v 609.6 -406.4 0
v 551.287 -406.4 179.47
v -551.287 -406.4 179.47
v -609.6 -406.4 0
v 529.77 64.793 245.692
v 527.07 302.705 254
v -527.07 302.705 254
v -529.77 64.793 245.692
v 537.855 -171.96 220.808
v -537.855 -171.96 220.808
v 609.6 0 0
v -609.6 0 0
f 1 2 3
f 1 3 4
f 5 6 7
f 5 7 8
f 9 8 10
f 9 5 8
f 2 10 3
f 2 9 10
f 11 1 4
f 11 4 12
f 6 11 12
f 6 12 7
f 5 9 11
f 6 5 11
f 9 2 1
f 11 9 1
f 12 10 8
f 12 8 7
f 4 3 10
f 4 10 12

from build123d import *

# Parameters (mm, degrees)
F1_DEPTH = 609.6
F3_DEPTH = 709.1064125189


with BuildPart() as f1:
    # F0 (on Right) → F1 (new body)
    with BuildSketch(Plane.YZ):
        with BuildLine():
            Line((-406.4, 179.4700178945), (-406.4, 0))
            Line((-406.4, 0), (0, 0))
            Line((0, 0), (302.7054125189, 254))
            ThreePointArc((302.7054125189, 254), (-53.8002691666, 235.3163289211), (-406.4, 179.4700178945))
        make_face()
    extrude(amount=F1_DEPTH)

    # F2 (on face) → F3 (cut, through all)
    with BuildSketch(Plane.XZ.offset(406.4)):
        Polygon((551.2866563028, 179.4700178945), (609.6, 0), (609.6, 179.4700178945), align=None)
        Polygon((519.0783191877, 278.5970867934), (551.2866563028, 179.4700178945), (609.6, 179.4700178945), (609.6, 278.5970867934), align=None)
    extrude(amount=-F3_DEPTH, mode=Mode.SUBTRACT)

    # F4: F1 across plane


with BuildPart() as f1_1:
    add(f1.part)
    add(f1.part.mirror(Plane.YZ))


solid = f1_1.part
